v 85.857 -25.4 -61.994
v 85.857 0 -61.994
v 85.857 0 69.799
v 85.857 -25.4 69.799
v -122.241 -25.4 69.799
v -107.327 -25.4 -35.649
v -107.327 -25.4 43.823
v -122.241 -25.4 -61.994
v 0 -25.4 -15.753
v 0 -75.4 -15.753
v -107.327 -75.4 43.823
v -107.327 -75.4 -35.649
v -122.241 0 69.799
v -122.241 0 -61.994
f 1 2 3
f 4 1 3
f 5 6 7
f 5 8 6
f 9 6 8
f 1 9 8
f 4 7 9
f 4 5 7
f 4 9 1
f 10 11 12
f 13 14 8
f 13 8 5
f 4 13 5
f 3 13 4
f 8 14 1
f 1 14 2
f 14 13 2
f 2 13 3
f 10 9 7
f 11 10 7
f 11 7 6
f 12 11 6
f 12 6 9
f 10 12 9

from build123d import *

# Parameters (mm, degrees)
F0_W     = 208.097614
F0_H     = 131.79294
F1_DEPTH = 25.4
F4_DEPTH = 50


with BuildPart() as f1:
    # F0 (on Front) → F1 (new body)
    with BuildSketch(Plane.XZ):
        with Locations((-18.191915, 3.902476)):
            Rectangle(F0_W, F0_H)
    extrude(amount=F1_DEPTH)

    # F3 (on face) → F4 (join)
    with BuildSketch(Plane.XZ.offset(25.4)):
        Polygon((-107.326537, -35.649035), (0, -15.753135), (-107.326537, 43.823242), align=None)
    extrude(amount=F4_DEPTH)


solid = f1.part
